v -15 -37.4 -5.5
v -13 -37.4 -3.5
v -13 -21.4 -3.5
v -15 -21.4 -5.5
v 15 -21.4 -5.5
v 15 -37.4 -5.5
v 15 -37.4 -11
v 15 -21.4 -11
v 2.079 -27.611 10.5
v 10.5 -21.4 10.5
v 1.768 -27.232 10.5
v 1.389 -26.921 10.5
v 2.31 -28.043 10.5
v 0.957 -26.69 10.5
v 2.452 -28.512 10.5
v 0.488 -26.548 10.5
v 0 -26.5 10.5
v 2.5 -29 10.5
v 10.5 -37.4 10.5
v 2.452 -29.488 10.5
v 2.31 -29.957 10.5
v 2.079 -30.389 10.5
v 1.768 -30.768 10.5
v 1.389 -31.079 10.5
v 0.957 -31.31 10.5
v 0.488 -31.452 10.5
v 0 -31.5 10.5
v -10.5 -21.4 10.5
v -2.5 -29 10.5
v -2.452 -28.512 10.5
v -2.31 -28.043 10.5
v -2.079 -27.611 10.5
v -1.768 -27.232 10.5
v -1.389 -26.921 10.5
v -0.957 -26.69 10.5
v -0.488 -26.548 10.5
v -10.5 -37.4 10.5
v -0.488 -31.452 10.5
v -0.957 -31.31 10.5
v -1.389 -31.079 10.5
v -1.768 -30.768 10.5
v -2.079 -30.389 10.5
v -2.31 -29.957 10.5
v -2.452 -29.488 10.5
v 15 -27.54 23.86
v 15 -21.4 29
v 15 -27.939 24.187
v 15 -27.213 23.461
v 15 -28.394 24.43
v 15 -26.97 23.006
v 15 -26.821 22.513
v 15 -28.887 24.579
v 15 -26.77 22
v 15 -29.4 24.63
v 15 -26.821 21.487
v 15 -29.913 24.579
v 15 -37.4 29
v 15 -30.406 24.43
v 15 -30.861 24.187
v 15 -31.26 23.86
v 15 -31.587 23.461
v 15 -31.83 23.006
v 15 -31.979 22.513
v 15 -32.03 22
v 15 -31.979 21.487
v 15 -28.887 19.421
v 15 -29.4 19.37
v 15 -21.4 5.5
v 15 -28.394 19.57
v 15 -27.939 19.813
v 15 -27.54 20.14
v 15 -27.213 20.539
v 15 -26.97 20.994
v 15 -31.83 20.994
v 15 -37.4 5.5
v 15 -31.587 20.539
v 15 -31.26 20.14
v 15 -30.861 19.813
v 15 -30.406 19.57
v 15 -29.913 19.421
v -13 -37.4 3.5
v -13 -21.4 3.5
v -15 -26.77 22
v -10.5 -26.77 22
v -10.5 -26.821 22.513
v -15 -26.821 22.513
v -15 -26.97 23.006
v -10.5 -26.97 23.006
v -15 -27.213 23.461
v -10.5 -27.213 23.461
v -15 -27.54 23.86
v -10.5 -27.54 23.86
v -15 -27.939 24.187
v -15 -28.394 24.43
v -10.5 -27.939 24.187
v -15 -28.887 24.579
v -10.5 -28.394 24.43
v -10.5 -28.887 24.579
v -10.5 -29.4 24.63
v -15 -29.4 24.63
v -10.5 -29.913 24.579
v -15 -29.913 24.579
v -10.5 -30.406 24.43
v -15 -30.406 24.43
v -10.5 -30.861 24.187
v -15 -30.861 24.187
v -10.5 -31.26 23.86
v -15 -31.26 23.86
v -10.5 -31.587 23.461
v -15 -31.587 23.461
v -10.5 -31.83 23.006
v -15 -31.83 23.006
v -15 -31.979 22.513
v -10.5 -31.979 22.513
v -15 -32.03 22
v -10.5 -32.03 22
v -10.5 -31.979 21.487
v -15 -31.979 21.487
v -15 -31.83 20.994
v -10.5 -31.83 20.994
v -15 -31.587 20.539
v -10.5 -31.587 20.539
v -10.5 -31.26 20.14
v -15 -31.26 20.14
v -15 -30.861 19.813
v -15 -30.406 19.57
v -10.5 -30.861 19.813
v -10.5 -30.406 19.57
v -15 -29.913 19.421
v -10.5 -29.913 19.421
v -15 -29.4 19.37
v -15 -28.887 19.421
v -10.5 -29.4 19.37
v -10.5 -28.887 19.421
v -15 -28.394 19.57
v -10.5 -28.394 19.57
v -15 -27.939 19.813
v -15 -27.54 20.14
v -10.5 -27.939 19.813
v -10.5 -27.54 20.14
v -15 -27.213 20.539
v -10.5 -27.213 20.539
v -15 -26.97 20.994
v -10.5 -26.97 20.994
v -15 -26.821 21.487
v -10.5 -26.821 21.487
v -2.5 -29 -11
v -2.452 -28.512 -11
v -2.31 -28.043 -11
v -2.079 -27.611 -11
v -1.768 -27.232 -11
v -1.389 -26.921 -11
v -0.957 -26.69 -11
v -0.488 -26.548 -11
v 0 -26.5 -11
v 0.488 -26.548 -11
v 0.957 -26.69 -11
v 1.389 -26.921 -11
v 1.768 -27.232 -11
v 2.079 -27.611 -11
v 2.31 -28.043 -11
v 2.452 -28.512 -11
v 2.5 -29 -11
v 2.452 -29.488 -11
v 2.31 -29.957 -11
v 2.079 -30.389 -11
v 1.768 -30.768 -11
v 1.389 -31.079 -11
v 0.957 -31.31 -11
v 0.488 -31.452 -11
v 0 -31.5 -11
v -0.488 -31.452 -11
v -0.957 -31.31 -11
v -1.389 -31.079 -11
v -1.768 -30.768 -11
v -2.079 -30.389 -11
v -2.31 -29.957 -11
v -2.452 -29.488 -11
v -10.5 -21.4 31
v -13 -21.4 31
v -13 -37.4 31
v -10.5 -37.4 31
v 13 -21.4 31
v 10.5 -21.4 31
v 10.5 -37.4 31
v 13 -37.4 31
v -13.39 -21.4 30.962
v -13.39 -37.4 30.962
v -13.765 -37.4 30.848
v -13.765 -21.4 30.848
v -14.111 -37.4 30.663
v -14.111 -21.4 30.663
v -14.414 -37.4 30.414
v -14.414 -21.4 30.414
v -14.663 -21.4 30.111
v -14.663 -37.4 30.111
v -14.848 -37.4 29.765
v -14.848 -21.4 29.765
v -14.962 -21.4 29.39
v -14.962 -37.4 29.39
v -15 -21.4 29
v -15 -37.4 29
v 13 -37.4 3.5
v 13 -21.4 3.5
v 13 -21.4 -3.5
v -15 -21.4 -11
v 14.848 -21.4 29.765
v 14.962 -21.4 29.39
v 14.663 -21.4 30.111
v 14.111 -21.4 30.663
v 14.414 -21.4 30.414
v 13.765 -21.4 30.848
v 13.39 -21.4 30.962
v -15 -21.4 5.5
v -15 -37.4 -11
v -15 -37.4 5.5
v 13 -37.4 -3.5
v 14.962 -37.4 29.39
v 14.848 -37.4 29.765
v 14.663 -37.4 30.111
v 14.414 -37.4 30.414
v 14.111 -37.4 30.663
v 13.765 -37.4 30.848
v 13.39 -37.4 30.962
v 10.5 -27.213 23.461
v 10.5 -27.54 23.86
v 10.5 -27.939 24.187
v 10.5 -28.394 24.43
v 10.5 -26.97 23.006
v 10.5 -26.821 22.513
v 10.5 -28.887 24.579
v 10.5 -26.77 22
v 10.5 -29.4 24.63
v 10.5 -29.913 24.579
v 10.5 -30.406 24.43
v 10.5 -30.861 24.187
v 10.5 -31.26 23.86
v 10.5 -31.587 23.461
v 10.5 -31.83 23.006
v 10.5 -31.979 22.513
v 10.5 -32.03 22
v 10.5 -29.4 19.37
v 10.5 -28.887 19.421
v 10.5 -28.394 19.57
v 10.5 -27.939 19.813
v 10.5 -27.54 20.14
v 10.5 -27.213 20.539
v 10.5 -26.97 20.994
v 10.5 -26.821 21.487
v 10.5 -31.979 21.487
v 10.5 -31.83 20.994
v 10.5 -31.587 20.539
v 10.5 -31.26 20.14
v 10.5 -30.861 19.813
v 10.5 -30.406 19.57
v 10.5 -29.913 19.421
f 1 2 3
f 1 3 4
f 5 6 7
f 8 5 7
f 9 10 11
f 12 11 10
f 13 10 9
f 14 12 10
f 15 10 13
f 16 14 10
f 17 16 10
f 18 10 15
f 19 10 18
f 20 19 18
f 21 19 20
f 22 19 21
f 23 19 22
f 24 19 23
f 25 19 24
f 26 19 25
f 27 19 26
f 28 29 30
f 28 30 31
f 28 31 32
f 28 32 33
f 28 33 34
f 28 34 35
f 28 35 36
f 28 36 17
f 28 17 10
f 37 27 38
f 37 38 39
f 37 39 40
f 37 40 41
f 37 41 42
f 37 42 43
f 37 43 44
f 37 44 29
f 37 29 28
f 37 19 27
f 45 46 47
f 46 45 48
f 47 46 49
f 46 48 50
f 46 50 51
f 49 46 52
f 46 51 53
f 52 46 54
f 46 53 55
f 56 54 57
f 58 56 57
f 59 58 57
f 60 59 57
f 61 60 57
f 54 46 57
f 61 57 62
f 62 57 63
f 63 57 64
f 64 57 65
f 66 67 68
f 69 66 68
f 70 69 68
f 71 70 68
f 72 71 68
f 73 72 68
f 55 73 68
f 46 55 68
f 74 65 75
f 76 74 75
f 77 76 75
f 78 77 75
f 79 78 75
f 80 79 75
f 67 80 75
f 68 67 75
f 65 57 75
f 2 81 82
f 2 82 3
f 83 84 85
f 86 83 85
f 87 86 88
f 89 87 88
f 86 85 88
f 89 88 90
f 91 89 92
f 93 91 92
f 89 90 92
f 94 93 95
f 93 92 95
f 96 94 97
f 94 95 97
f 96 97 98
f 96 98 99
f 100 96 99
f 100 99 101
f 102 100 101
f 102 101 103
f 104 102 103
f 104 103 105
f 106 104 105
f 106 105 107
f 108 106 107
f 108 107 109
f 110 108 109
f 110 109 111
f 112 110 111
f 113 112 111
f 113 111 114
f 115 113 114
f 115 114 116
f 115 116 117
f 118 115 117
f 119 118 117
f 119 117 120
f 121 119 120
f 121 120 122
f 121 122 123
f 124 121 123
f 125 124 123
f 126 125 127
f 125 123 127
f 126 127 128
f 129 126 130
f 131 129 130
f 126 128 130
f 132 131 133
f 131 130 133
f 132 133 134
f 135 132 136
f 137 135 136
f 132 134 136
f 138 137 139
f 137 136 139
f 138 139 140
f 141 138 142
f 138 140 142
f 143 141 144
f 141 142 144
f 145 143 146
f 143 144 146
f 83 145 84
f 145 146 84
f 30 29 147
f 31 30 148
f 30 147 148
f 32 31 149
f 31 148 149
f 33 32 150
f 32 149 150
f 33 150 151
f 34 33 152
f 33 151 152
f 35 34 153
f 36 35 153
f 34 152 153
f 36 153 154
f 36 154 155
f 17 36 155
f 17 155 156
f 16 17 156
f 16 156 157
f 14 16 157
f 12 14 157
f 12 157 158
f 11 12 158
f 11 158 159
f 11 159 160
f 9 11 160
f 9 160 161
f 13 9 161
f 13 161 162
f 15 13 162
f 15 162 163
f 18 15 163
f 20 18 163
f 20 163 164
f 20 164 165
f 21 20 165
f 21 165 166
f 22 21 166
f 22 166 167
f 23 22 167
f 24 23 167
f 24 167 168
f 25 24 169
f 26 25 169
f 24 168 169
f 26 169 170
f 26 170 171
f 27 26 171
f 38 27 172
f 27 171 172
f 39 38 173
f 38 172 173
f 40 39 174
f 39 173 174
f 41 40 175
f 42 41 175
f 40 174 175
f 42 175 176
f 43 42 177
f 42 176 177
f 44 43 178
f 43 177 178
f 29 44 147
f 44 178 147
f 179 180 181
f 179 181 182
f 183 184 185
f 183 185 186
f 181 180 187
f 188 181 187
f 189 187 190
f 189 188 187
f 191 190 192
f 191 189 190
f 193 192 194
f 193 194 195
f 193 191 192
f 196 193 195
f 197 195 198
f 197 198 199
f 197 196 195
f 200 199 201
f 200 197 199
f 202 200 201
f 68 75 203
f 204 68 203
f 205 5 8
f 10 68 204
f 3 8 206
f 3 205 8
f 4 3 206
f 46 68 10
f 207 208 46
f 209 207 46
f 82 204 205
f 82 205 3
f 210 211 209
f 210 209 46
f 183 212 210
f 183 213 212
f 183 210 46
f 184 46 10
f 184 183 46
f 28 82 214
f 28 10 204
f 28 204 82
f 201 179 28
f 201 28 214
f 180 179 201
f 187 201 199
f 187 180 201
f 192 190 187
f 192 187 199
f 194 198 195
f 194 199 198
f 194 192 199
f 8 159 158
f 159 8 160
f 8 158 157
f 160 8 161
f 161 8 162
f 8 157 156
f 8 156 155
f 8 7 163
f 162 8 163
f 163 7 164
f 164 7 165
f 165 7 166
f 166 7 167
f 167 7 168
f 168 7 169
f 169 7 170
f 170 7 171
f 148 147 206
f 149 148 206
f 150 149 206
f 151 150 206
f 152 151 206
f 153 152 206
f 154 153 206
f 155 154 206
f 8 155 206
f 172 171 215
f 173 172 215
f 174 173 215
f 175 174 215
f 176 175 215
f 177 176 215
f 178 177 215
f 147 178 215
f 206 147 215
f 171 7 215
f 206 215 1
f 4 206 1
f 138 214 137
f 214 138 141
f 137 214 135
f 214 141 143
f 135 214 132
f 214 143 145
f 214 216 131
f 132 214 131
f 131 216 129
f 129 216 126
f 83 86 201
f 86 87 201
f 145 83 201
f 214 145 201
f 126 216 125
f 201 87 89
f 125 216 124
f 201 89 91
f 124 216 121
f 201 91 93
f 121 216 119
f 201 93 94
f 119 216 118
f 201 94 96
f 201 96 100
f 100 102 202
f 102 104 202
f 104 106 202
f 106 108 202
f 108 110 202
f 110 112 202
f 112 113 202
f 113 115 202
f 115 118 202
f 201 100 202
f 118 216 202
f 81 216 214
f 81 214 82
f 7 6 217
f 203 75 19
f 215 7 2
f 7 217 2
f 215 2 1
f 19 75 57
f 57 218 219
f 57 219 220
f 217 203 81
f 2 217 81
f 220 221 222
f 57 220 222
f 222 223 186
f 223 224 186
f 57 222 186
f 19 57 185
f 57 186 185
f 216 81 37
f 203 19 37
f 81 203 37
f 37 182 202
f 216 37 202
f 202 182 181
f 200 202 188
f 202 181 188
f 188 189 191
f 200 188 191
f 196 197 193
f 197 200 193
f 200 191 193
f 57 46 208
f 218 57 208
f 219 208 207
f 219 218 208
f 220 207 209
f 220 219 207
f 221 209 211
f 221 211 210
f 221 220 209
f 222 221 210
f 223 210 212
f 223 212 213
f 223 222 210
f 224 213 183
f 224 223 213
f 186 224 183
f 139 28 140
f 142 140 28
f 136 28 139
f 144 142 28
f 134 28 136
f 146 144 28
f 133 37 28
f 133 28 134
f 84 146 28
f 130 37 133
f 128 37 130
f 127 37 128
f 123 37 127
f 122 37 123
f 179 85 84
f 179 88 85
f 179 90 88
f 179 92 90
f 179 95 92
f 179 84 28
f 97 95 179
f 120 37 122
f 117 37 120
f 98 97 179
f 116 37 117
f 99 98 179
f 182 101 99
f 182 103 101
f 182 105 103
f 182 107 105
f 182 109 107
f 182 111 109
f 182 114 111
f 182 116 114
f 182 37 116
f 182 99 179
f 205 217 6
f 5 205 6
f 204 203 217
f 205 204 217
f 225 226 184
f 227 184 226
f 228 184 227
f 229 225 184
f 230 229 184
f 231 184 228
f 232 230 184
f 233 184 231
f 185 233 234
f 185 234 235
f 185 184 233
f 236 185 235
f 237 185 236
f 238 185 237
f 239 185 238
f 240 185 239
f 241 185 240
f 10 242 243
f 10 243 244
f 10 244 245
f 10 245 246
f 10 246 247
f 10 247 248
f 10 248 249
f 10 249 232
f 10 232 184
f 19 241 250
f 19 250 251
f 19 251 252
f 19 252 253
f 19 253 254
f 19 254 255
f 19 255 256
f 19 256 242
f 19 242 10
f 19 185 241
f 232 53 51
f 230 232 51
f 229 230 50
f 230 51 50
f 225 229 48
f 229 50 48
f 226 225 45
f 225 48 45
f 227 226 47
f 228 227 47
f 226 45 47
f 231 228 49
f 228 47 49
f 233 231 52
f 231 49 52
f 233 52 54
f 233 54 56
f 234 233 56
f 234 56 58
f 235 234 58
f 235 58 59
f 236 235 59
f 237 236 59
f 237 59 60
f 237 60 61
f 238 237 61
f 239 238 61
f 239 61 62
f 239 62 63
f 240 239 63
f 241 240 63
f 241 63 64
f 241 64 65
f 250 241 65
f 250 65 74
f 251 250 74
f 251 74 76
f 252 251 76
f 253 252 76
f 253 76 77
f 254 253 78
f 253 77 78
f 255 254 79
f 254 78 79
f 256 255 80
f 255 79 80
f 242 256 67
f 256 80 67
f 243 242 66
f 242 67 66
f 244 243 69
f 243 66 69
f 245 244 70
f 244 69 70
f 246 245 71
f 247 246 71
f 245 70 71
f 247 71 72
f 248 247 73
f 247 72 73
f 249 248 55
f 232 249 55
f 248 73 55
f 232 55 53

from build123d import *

# Parameters (mm, degrees)
PAD029_DEPTH         = 16
SKETCH091_R          = 2.5
POCKET046_DEPTH      = 42.001
SKETCH092_R          = 2.63
POCKET047_DEPTH      = 30.001
POCKET047_DEPTH_BACK = 0.001


with BuildPart() as part:
    # Sketch089 → Pad029 (new body)
    with BuildSketch(Plane.XZ.offset(37.4)):
        with BuildLine():
            Line((-13, 31), (-10.5, 31))
            Line((-10.5, 10.5), (-10.5, 31))
            Line((10.5, 10.5), (-10.5, 10.5))
            Line((10.5, 31), (10.5, 10.5))
            Line((10.5, 31), (13, 31))
            ThreePointArc((15, 29), (14.414214, 30.414214), (13, 31))
            Line((15, 29), (15, 5.5))
            Line((15, 5.5), (13, 3.5))
            Line((13, 3.5), (13, -3.5))
            Line((13, -3.5), (15, -5.5))
            Line((15, -5.5), (15, -11))
            Line((15, -11), (-15, -11))
            Line((-15, -11), (-15, -5.5))
            Line((-13, -3.5), (-15, -5.5))
            Line((-13, 3.5), (-13, -3.5))
            Line((-15, 5.5), (-13, 3.5))
            Line((-15, 5.5), (-15, 29))
            ThreePointArc((-13, 31), (-14.414214, 30.414214), (-15, 29))
        make_face()
    extrude(amount=-PAD029_DEPTH)

    # Sketch091 → Pocket046 (cut, through all)
    with BuildSketch(Plane(origin=(0, 0, -11), x_dir=(-1, 0, 0), z_dir=(0, 0, -1))):
        with Locations((0, -29)):
            Circle(SKETCH091_R)
    extrude(amount=-POCKET046_DEPTH, mode=Mode.SUBTRACT)

    # Sketch092 → Pocket047 (cut, two sides)
    with BuildSketch(Plane(origin=(15, -29.4, 0), x_dir=(0, 1, 0), z_dir=(1, 0, 0))) as pocket047_sk:
        with Locations((0, 22)):
            Circle(SKETCH092_R)
    extrude(amount=-POCKET047_DEPTH, mode=Mode.SUBTRACT)
    extrude(pocket047_sk.sketch, amount=POCKET047_DEPTH_BACK, mode=Mode.SUBTRACT)


solid = part.part
